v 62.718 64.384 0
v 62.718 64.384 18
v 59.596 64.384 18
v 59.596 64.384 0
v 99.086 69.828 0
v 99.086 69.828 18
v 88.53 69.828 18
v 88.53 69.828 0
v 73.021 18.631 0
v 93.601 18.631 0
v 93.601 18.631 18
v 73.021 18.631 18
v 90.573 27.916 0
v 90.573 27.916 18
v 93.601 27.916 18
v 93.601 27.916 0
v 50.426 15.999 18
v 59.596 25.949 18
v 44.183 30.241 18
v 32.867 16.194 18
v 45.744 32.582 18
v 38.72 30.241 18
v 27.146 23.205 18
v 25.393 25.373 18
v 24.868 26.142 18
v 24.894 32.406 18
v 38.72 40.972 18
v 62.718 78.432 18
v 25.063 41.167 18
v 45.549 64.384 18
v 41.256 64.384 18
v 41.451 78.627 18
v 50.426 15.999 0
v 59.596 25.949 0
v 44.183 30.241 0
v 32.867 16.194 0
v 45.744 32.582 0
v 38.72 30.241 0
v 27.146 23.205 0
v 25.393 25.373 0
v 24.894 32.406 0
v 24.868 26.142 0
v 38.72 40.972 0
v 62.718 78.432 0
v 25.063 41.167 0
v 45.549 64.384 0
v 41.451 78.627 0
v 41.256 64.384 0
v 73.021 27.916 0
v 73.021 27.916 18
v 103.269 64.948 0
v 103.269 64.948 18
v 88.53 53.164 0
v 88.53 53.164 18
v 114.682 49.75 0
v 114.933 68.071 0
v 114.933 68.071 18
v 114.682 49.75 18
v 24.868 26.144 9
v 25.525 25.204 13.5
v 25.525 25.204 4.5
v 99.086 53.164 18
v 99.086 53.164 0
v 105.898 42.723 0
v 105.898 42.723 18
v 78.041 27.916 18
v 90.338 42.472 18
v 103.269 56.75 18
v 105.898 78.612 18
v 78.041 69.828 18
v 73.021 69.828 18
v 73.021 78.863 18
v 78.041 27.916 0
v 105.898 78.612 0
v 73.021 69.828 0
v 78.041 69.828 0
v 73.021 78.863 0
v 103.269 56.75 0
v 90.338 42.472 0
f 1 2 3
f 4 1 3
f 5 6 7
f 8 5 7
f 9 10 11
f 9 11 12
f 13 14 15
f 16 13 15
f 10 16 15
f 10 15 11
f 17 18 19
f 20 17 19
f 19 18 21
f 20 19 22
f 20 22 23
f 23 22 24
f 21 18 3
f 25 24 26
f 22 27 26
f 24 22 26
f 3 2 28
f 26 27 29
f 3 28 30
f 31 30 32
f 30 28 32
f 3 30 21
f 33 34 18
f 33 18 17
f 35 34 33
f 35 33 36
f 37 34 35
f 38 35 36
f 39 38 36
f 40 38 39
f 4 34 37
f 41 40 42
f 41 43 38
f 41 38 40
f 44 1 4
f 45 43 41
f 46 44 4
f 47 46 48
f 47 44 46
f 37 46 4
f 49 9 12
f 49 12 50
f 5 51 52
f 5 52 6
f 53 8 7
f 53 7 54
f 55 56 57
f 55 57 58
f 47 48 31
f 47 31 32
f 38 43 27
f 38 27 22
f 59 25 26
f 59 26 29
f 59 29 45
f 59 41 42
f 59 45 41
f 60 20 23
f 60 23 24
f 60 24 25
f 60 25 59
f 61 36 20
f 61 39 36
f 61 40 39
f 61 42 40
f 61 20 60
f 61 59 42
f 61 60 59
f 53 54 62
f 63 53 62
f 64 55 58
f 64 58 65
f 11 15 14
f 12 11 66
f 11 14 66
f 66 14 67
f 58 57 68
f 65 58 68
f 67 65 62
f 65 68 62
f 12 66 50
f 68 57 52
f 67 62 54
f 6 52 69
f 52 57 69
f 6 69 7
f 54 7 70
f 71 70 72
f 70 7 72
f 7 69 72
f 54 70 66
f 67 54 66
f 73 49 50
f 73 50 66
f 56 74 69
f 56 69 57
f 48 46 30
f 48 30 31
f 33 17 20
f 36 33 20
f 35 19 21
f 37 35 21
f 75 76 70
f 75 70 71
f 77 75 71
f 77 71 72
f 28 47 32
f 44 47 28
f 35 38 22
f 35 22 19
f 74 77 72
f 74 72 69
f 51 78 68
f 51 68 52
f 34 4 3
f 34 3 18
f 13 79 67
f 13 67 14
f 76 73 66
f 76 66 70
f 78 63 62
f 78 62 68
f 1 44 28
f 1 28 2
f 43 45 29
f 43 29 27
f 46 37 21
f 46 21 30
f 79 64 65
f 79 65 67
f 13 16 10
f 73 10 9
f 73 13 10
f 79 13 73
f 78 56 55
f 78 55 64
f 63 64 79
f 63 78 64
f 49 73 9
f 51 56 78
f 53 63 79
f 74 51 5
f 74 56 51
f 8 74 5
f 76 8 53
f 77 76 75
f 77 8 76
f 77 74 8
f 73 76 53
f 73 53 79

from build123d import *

# Parameters (mm, degrees)
BOSS_EXTRUDE1_DEPTH   = 18
BOSS_EXTRUDE1_2_DEPTH = 18


with BuildPart() as part:
    # Sketch2 → Boss-Extrude1 (new body)
    with BuildSketch(Plane.XY):
        with BuildLine():
            Line((41.451402768, 78.627112804), (62.71779308, 78.432008305))
            Line((62.71779308, 78.432008305), (62.71779308, 64.38448443))
            Line((62.71779308, 64.38448443), (59.596121107, 64.38448443))
            Line((59.596121107, 64.38448443), (59.596121107, 25.94889827))
            Line((59.596121107, 25.94889827), (50.426209689, 15.998568858))
            Line((50.426209689, 15.998568858), (32.866804844, 16.193673357))
            add(Edge.make_bspline(
                [(32.866804844, 16.193673357), (31.910610057, 17.627965538), (24.872485991, 25.751722249), (24.867520415, 26.144002768), (24.804131767, 31.151705999), (24.997590081, 36.159367013), (25.062624913, 41.167049135)],
                knots=[0, 0, 0, 0, 1, 1, 1, 2, 2, 2, 2], degree=3))
            Line((25.062624913, 41.167049135), (38.719939792, 40.971944637))
            Line((38.719939792, 40.971944637), (38.719939792, 30.241197232))
            Line((38.719939792, 30.241197232), (44.182865744, 30.241197232))
            Line((44.182865744, 30.241197232), (45.74370173, 32.582451211))
            Line((45.74370173, 32.582451211), (45.548597232, 64.38448443))
            Line((45.548597232, 64.38448443), (41.25629827, 64.38448443))
            Line((41.25629827, 64.38448443), (41.451402768, 78.627112804))
        make_face()
    extrude(amount=BOSS_EXTRUDE1_DEPTH)


with BuildPart() as body_2:
    # Sketch2 → Boss-Extrude1 2 (new body)
    with BuildSketch(Plane.XY):
        Polygon((73.021358937, 78.862525948), (105.897964848, 78.61155949), (114.932757312, 68.070968282), (114.681790855, 49.750416896), (105.897964848, 42.723356091), (90.338044493, 42.472389633), (90.572819566, 27.916335108), (93.600608438, 27.916335108), (93.600608438, 18.630576186), (73.021358937, 18.630576186), (73.021358937, 27.916335108), (78.040688083, 27.916335108), (78.040688083, 69.827733483), (73.021358937, 69.827733483), align=None)
        Polygon((88.530273253, 69.827733483), (88.530273253, 53.164474994), (99.086194651, 53.164474994), (103.268762855, 56.749533454), (103.268762855, 64.948070578), (99.086194651, 69.827733483), align=None, mode=Mode.SUBTRACT)
    extrude(amount=BOSS_EXTRUDE1_2_DEPTH)


solid = Compound([part.part, body_2.part])
